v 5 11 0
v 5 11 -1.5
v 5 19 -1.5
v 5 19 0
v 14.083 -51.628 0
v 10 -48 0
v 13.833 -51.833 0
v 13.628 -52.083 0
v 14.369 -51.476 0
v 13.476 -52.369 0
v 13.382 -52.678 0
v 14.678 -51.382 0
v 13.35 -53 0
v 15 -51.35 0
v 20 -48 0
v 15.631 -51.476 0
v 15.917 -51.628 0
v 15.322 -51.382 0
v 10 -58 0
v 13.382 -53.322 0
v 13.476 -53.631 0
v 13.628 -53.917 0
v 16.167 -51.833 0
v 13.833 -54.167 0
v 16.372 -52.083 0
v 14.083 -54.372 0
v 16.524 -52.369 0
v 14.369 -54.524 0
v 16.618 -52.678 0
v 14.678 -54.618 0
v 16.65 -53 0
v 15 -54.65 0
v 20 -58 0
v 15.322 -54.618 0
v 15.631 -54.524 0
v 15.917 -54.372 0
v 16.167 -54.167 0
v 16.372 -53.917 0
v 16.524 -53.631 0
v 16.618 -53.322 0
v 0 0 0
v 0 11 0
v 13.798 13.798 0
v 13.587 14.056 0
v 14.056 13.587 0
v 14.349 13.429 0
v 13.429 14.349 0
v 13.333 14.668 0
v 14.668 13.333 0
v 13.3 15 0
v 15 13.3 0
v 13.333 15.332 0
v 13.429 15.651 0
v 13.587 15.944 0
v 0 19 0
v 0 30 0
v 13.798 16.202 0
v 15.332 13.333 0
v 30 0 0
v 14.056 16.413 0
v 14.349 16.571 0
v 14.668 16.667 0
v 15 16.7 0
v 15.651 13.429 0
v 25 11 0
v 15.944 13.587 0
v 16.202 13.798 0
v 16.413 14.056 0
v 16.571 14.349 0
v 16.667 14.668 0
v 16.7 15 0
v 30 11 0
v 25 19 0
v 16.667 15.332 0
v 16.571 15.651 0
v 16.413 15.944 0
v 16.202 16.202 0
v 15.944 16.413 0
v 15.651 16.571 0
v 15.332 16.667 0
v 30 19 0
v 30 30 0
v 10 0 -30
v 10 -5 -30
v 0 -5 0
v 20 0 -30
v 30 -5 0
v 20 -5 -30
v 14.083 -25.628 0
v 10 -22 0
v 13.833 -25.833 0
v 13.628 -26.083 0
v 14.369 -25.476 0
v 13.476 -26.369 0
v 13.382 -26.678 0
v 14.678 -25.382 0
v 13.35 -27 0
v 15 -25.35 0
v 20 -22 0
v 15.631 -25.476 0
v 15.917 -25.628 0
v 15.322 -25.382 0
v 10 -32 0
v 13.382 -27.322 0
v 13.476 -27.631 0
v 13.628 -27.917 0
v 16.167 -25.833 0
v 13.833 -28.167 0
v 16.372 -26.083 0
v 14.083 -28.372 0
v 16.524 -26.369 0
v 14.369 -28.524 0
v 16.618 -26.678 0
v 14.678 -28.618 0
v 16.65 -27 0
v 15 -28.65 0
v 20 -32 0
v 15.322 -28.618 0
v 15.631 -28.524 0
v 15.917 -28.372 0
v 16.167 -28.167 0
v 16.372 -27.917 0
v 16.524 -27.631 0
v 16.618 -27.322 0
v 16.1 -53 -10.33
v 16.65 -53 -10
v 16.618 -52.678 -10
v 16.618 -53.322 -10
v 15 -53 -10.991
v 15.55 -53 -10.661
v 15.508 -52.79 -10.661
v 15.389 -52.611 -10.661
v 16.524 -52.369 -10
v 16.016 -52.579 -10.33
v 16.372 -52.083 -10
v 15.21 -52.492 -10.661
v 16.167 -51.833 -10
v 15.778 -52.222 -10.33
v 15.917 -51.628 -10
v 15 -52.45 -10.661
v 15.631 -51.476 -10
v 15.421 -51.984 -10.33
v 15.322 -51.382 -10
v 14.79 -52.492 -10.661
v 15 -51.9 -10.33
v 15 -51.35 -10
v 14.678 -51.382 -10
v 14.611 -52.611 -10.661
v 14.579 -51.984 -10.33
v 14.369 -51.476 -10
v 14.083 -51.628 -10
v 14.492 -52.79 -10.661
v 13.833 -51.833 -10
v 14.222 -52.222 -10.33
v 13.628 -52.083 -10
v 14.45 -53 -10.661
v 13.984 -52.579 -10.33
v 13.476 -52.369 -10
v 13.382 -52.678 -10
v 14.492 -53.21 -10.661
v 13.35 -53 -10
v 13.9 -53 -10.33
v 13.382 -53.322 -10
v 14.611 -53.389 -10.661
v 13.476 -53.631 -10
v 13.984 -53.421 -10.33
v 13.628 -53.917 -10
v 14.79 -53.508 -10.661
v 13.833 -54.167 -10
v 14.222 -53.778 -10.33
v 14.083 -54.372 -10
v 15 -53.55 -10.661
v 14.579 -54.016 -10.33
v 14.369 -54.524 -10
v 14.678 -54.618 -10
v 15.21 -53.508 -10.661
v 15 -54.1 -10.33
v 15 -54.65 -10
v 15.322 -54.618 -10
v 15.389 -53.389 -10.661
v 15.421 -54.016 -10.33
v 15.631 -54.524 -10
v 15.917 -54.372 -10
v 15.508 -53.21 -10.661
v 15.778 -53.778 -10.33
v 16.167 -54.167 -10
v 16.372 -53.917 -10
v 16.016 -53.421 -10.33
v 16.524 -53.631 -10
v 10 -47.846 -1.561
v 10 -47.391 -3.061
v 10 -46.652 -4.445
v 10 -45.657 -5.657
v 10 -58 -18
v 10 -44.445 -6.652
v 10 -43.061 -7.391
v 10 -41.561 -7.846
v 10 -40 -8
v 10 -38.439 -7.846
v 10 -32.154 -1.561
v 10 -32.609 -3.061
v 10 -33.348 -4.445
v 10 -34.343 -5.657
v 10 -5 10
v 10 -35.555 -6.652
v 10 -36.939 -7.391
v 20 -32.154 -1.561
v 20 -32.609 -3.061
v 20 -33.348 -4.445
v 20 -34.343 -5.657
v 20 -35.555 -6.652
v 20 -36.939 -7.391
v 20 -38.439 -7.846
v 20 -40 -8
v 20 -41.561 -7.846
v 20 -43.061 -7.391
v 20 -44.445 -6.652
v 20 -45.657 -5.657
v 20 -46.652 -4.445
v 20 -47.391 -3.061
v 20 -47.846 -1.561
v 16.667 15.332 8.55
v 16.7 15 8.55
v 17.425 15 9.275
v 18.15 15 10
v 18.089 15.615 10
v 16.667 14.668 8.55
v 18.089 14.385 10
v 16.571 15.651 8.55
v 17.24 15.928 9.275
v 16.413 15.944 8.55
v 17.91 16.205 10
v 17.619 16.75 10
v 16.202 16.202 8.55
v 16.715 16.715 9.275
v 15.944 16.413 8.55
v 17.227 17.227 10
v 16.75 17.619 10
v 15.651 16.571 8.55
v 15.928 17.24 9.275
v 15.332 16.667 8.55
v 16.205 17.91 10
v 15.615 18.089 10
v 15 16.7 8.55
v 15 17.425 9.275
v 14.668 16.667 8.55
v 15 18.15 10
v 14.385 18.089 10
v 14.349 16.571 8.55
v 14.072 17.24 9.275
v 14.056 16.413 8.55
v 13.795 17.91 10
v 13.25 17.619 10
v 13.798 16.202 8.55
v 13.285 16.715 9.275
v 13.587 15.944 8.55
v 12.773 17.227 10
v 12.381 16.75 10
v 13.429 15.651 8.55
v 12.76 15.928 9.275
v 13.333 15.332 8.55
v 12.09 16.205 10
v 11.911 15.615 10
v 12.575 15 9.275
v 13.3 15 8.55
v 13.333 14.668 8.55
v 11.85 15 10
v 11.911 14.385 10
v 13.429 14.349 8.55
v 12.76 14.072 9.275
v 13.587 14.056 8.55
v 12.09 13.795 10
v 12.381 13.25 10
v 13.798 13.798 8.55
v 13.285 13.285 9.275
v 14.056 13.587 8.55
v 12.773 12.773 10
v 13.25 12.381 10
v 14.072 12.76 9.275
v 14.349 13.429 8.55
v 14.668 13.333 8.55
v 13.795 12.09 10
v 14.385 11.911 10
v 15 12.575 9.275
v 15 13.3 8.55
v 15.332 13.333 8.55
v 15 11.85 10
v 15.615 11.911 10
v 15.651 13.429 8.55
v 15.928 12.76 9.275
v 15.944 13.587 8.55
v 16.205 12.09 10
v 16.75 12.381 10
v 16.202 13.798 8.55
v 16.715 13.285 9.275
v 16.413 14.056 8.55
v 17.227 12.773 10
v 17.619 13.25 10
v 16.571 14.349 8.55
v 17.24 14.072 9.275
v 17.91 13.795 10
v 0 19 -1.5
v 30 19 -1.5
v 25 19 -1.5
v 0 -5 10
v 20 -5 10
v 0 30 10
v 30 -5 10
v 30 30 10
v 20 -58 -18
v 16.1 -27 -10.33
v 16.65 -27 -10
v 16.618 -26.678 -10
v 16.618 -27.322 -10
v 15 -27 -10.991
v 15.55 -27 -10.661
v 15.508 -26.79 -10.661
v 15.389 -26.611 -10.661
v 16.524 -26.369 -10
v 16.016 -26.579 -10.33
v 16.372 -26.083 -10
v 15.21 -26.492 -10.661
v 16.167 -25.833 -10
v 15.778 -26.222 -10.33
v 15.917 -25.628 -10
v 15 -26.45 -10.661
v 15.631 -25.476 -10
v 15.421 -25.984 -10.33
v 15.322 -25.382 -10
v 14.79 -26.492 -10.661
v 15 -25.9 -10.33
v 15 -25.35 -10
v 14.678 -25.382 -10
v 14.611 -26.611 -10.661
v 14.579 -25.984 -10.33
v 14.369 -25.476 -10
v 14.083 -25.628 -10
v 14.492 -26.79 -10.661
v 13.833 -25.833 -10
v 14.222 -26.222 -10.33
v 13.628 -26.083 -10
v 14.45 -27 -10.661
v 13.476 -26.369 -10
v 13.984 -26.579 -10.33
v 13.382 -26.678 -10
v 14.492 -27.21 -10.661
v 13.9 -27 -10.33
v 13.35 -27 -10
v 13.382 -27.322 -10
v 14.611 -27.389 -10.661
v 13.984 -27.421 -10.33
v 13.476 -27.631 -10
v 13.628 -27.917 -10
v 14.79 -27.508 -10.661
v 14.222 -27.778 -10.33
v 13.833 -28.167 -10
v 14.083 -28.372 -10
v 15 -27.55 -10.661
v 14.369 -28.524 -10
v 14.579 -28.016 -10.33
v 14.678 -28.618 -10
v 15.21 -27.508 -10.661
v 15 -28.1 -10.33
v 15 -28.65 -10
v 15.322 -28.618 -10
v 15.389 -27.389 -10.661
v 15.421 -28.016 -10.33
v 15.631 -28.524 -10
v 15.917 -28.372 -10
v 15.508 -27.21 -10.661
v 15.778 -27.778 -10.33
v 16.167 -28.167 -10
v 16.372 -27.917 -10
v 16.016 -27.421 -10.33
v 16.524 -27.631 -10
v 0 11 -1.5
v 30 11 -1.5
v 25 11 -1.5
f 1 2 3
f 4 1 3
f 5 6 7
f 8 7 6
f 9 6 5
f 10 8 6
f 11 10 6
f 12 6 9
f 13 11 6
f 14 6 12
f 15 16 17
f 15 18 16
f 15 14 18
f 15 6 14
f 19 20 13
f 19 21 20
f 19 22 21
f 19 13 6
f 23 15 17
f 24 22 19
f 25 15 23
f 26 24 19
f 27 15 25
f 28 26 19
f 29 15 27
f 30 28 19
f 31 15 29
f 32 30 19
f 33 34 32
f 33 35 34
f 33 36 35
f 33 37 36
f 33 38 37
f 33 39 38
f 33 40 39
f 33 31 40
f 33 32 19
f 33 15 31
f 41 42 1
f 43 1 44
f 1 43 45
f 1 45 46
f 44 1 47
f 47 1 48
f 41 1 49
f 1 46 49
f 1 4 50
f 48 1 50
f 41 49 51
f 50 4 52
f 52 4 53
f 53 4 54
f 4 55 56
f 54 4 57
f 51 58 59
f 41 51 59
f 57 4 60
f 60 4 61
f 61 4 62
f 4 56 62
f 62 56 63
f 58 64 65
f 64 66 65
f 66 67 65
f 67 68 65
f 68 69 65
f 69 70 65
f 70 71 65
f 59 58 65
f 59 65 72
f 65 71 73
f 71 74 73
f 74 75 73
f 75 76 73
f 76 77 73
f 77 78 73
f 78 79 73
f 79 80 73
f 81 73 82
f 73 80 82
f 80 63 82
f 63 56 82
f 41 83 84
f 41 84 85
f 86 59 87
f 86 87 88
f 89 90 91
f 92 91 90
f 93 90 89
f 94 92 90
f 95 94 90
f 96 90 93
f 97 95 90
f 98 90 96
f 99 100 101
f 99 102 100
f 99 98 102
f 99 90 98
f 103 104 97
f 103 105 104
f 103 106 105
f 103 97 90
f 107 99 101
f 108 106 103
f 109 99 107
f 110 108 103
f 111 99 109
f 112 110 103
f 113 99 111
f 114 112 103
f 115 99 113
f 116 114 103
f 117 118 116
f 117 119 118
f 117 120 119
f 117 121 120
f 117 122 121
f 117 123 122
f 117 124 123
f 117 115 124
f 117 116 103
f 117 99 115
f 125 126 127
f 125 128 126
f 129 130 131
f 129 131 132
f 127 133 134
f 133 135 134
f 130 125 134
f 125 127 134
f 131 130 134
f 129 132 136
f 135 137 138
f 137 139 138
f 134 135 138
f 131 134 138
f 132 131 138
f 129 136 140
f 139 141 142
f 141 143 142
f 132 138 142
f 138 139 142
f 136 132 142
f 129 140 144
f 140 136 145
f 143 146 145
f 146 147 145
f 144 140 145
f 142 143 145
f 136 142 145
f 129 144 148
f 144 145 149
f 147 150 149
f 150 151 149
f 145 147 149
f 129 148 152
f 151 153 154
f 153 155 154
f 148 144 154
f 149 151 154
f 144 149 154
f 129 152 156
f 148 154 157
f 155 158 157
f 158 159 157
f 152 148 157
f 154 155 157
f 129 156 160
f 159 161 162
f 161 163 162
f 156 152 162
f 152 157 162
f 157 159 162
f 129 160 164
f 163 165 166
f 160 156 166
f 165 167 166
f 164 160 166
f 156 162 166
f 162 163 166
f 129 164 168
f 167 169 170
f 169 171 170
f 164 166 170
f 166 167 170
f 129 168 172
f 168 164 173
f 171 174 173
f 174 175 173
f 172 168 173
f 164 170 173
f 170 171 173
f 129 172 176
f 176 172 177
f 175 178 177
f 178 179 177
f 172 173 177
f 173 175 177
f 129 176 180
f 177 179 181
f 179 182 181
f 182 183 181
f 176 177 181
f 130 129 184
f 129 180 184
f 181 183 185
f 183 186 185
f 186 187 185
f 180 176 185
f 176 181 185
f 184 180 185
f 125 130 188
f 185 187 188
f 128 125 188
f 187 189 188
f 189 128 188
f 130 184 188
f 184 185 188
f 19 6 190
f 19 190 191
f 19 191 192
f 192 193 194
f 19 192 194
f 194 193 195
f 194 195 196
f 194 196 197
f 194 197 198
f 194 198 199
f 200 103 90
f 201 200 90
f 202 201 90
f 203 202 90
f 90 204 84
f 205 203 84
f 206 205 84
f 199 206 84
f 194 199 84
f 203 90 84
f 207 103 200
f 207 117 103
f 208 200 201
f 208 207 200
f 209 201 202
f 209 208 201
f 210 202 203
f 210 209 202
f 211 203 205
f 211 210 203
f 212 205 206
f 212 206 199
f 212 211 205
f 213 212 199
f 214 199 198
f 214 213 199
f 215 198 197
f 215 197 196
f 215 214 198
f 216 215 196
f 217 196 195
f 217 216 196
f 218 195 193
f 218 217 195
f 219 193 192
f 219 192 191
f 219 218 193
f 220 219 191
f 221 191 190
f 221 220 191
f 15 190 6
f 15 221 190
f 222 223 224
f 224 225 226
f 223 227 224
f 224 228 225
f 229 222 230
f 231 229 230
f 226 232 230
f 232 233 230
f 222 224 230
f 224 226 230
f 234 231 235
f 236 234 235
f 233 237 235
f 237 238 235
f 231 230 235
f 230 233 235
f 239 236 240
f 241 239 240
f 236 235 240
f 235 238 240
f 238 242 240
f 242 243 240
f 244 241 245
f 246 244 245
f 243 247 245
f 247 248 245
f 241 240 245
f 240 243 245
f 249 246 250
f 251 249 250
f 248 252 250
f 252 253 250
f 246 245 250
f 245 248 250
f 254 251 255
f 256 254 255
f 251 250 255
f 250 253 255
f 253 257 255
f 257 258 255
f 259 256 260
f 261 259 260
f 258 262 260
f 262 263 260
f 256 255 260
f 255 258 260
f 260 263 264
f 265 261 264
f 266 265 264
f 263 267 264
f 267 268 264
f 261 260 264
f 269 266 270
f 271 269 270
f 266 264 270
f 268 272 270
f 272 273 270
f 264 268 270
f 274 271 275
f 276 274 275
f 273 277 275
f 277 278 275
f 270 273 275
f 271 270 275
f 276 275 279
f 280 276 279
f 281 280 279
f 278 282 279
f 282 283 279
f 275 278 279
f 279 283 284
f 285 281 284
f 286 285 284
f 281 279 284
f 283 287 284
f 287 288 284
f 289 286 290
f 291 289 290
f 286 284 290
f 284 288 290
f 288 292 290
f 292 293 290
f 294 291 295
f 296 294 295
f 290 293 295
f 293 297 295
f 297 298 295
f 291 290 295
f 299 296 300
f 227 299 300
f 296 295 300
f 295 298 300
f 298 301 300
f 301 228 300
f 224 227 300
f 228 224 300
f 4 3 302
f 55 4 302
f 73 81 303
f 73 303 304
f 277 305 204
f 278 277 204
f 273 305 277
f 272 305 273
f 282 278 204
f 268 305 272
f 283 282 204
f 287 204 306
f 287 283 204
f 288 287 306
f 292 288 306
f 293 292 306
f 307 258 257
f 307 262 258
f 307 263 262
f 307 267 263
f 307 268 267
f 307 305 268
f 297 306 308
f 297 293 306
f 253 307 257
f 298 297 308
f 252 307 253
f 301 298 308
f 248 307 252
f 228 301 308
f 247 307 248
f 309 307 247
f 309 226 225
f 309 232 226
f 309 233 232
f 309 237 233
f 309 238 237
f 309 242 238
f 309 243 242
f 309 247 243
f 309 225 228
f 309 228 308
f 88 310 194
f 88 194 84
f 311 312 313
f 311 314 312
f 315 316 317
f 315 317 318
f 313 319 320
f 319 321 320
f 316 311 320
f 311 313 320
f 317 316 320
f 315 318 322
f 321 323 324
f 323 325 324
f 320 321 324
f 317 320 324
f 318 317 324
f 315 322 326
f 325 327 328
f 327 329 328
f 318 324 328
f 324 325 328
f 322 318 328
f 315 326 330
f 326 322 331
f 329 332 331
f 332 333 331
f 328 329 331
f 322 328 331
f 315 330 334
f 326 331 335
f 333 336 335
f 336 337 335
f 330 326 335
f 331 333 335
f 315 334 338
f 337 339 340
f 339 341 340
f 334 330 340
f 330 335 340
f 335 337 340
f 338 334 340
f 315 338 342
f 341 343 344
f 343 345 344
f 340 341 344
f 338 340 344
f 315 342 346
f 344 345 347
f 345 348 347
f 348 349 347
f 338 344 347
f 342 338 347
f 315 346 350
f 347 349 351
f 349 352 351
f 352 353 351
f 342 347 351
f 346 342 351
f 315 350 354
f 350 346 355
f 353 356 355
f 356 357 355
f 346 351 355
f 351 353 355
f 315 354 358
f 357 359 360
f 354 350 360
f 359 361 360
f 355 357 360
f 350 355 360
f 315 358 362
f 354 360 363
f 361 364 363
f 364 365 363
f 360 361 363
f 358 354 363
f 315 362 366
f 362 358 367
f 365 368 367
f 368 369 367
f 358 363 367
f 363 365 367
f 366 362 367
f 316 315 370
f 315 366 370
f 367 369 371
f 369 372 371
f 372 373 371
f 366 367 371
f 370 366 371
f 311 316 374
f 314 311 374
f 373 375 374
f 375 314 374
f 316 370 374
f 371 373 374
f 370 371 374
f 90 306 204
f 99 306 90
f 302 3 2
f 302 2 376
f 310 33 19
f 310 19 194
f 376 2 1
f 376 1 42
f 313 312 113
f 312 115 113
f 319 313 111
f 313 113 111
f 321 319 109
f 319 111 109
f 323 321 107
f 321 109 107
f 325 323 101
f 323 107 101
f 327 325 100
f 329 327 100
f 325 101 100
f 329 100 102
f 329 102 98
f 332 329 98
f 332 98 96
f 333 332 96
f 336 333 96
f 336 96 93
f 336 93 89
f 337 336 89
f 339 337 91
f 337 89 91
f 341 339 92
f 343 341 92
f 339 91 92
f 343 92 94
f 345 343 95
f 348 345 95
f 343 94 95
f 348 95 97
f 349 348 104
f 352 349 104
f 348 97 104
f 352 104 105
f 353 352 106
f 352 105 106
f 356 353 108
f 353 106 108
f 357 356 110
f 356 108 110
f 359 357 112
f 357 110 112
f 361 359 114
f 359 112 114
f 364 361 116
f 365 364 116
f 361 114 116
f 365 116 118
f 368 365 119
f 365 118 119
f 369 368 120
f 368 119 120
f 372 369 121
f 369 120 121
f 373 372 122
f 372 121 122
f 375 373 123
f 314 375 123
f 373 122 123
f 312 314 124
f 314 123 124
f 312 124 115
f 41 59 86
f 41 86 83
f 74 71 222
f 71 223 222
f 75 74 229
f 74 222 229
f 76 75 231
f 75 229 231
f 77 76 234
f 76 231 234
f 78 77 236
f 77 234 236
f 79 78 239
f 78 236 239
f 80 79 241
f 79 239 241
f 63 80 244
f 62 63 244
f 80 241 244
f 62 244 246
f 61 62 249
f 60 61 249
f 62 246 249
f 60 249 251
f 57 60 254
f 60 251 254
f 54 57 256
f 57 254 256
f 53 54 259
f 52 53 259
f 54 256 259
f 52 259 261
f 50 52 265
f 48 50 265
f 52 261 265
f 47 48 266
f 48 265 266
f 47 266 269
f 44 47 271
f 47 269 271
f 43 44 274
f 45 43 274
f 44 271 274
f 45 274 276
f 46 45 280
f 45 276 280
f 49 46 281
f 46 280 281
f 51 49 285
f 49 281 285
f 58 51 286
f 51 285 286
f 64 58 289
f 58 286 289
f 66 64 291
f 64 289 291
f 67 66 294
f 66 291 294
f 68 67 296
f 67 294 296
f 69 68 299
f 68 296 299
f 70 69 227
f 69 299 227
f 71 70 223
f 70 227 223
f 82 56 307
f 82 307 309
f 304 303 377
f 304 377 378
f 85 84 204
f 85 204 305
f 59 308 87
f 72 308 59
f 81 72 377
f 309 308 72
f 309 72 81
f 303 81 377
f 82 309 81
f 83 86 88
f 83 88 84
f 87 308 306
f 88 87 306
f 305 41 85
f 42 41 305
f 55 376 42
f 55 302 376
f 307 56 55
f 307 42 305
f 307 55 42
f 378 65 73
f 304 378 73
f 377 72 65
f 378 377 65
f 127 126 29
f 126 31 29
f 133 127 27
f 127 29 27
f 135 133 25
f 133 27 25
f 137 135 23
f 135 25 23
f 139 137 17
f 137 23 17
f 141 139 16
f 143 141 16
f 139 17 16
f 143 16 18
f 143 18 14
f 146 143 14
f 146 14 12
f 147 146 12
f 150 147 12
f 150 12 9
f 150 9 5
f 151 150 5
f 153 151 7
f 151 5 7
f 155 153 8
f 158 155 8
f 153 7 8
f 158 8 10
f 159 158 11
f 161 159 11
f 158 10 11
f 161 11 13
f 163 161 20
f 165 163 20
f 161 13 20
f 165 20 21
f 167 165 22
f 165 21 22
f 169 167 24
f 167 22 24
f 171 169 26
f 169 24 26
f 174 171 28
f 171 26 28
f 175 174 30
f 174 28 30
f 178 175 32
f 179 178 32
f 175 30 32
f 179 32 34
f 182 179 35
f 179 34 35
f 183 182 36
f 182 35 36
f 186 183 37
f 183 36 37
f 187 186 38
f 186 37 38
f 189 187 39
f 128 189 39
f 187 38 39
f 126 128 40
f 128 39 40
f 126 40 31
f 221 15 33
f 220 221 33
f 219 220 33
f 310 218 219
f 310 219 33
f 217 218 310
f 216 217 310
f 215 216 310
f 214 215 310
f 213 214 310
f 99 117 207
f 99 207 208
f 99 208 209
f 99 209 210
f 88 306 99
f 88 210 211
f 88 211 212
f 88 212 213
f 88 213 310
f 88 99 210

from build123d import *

# Parameters (mm, degrees)
SKETCH_1_W      = 30
SKETCH_1_H      = 30
EXTRUDE_1_DEPTH = 10
EXTRUDE_2_DEPTH = 5
EXTRUDE_3_DEPTH = 5
SKETCH_6_W      = 5
SKETCH_6_H      = 8
EXTRUDE_4_DEPTH = 1.5


# Read off the part's stored shape, not the designer's step: 高级异型孔1, 高级异型孔2
with BuildPart() as part:
    # 草图1 → 凸台-拉伸1 (new body)
    with BuildSketch(Plane.XY):
        with Locations((15, 15)):
            Rectangle(SKETCH_1_W, SKETCH_1_H)
    extrude(amount=EXTRUDE_1_DEPTH)

    # 草图2 → 凸台-拉伸2 (add)
    with BuildSketch(Plane.XZ):
        Polygon((0, 10), (30, 10), (30, 0), (20, -30), (10, -30), (0, 0), align=None)
    extrude(amount=EXTRUDE_2_DEPTH)

    # 草图3 → 凸台-拉伸3 (add, symmetric)
    with BuildSketch(Plane(origin=(15, 0, 0), x_dir=(0, 0, -1), z_dir=(1, 0, 0))):
        with BuildLine():
            Line((0, -48), (0, -58))
            Line((0, -58), (18, -58))
            Line((18, -58), (30, -5))
            Line((30, -5), (-10, -5))
            Line((-10, -5), (0, -22))
            Line((0, -22), (0, -32))
            ThreePointArc((0, -32), (8, -40), (0, -48))
        make_face()
    extrude(amount=EXTRUDE_3_DEPTH, both=True)

    # 草图6 → 凸台-拉伸4 (add, symmetric)
    with BuildSketch(Plane(origin=(0, 0, 0), x_dir=(-1, 0, 0), z_dir=(0, 0, -1))):
        with Locations((-27.5, 15)):
            Rectangle(SKETCH_6_W, SKETCH_6_H)
        with Locations((-2.5, 15)):
            Rectangle(SKETCH_6_W, SKETCH_6_H)
    extrude(amount=EXTRUDE_4_DEPTH, both=True)

    # 高级异型孔1 outline → 高级异型孔1 (revolve, cut)
    with BuildSketch(Plane(origin=(15, 15, 0), x_dir=(1, 0, 0), z_dir=(0, -1, 0))):
        Polygon((3.15, 10), (0, 10), (0, 0), (1.7, 0), (1.7, 8.55), align=None)
    revolve(axis=Axis((15, 15, 0), (0, 0, 1)), mode=Mode.SUBTRACT)

    # 高级异型孔2 outline → 高级异型孔2 (revolve, cut)
    with BuildSketch(Plane(origin=(15, -53, 0), x_dir=(1, 0, 0), z_dir=(0, -1, 0))):
        Polygon((0, -10.991420021), (1.65, -10), (1.65, 0), (0, 0), align=None)
    revolve(axis=Axis((15, -53, 0), (0, 0, 1)), mode=Mode.SUBTRACT)

    # Other 2 2 outline → Other 2 2 (revolve, cut)
    with BuildSketch(Plane(origin=(15, -27, 0), x_dir=(1, 0, 0), z_dir=(0, -1, 0))):
        Polygon((0, -10.991420021), (1.65, -10), (1.65, 0), (0, 0), align=None)
    revolve(axis=Axis((15, -27, 0), (0, 0, 1)), mode=Mode.SUBTRACT)


solid = part.part
